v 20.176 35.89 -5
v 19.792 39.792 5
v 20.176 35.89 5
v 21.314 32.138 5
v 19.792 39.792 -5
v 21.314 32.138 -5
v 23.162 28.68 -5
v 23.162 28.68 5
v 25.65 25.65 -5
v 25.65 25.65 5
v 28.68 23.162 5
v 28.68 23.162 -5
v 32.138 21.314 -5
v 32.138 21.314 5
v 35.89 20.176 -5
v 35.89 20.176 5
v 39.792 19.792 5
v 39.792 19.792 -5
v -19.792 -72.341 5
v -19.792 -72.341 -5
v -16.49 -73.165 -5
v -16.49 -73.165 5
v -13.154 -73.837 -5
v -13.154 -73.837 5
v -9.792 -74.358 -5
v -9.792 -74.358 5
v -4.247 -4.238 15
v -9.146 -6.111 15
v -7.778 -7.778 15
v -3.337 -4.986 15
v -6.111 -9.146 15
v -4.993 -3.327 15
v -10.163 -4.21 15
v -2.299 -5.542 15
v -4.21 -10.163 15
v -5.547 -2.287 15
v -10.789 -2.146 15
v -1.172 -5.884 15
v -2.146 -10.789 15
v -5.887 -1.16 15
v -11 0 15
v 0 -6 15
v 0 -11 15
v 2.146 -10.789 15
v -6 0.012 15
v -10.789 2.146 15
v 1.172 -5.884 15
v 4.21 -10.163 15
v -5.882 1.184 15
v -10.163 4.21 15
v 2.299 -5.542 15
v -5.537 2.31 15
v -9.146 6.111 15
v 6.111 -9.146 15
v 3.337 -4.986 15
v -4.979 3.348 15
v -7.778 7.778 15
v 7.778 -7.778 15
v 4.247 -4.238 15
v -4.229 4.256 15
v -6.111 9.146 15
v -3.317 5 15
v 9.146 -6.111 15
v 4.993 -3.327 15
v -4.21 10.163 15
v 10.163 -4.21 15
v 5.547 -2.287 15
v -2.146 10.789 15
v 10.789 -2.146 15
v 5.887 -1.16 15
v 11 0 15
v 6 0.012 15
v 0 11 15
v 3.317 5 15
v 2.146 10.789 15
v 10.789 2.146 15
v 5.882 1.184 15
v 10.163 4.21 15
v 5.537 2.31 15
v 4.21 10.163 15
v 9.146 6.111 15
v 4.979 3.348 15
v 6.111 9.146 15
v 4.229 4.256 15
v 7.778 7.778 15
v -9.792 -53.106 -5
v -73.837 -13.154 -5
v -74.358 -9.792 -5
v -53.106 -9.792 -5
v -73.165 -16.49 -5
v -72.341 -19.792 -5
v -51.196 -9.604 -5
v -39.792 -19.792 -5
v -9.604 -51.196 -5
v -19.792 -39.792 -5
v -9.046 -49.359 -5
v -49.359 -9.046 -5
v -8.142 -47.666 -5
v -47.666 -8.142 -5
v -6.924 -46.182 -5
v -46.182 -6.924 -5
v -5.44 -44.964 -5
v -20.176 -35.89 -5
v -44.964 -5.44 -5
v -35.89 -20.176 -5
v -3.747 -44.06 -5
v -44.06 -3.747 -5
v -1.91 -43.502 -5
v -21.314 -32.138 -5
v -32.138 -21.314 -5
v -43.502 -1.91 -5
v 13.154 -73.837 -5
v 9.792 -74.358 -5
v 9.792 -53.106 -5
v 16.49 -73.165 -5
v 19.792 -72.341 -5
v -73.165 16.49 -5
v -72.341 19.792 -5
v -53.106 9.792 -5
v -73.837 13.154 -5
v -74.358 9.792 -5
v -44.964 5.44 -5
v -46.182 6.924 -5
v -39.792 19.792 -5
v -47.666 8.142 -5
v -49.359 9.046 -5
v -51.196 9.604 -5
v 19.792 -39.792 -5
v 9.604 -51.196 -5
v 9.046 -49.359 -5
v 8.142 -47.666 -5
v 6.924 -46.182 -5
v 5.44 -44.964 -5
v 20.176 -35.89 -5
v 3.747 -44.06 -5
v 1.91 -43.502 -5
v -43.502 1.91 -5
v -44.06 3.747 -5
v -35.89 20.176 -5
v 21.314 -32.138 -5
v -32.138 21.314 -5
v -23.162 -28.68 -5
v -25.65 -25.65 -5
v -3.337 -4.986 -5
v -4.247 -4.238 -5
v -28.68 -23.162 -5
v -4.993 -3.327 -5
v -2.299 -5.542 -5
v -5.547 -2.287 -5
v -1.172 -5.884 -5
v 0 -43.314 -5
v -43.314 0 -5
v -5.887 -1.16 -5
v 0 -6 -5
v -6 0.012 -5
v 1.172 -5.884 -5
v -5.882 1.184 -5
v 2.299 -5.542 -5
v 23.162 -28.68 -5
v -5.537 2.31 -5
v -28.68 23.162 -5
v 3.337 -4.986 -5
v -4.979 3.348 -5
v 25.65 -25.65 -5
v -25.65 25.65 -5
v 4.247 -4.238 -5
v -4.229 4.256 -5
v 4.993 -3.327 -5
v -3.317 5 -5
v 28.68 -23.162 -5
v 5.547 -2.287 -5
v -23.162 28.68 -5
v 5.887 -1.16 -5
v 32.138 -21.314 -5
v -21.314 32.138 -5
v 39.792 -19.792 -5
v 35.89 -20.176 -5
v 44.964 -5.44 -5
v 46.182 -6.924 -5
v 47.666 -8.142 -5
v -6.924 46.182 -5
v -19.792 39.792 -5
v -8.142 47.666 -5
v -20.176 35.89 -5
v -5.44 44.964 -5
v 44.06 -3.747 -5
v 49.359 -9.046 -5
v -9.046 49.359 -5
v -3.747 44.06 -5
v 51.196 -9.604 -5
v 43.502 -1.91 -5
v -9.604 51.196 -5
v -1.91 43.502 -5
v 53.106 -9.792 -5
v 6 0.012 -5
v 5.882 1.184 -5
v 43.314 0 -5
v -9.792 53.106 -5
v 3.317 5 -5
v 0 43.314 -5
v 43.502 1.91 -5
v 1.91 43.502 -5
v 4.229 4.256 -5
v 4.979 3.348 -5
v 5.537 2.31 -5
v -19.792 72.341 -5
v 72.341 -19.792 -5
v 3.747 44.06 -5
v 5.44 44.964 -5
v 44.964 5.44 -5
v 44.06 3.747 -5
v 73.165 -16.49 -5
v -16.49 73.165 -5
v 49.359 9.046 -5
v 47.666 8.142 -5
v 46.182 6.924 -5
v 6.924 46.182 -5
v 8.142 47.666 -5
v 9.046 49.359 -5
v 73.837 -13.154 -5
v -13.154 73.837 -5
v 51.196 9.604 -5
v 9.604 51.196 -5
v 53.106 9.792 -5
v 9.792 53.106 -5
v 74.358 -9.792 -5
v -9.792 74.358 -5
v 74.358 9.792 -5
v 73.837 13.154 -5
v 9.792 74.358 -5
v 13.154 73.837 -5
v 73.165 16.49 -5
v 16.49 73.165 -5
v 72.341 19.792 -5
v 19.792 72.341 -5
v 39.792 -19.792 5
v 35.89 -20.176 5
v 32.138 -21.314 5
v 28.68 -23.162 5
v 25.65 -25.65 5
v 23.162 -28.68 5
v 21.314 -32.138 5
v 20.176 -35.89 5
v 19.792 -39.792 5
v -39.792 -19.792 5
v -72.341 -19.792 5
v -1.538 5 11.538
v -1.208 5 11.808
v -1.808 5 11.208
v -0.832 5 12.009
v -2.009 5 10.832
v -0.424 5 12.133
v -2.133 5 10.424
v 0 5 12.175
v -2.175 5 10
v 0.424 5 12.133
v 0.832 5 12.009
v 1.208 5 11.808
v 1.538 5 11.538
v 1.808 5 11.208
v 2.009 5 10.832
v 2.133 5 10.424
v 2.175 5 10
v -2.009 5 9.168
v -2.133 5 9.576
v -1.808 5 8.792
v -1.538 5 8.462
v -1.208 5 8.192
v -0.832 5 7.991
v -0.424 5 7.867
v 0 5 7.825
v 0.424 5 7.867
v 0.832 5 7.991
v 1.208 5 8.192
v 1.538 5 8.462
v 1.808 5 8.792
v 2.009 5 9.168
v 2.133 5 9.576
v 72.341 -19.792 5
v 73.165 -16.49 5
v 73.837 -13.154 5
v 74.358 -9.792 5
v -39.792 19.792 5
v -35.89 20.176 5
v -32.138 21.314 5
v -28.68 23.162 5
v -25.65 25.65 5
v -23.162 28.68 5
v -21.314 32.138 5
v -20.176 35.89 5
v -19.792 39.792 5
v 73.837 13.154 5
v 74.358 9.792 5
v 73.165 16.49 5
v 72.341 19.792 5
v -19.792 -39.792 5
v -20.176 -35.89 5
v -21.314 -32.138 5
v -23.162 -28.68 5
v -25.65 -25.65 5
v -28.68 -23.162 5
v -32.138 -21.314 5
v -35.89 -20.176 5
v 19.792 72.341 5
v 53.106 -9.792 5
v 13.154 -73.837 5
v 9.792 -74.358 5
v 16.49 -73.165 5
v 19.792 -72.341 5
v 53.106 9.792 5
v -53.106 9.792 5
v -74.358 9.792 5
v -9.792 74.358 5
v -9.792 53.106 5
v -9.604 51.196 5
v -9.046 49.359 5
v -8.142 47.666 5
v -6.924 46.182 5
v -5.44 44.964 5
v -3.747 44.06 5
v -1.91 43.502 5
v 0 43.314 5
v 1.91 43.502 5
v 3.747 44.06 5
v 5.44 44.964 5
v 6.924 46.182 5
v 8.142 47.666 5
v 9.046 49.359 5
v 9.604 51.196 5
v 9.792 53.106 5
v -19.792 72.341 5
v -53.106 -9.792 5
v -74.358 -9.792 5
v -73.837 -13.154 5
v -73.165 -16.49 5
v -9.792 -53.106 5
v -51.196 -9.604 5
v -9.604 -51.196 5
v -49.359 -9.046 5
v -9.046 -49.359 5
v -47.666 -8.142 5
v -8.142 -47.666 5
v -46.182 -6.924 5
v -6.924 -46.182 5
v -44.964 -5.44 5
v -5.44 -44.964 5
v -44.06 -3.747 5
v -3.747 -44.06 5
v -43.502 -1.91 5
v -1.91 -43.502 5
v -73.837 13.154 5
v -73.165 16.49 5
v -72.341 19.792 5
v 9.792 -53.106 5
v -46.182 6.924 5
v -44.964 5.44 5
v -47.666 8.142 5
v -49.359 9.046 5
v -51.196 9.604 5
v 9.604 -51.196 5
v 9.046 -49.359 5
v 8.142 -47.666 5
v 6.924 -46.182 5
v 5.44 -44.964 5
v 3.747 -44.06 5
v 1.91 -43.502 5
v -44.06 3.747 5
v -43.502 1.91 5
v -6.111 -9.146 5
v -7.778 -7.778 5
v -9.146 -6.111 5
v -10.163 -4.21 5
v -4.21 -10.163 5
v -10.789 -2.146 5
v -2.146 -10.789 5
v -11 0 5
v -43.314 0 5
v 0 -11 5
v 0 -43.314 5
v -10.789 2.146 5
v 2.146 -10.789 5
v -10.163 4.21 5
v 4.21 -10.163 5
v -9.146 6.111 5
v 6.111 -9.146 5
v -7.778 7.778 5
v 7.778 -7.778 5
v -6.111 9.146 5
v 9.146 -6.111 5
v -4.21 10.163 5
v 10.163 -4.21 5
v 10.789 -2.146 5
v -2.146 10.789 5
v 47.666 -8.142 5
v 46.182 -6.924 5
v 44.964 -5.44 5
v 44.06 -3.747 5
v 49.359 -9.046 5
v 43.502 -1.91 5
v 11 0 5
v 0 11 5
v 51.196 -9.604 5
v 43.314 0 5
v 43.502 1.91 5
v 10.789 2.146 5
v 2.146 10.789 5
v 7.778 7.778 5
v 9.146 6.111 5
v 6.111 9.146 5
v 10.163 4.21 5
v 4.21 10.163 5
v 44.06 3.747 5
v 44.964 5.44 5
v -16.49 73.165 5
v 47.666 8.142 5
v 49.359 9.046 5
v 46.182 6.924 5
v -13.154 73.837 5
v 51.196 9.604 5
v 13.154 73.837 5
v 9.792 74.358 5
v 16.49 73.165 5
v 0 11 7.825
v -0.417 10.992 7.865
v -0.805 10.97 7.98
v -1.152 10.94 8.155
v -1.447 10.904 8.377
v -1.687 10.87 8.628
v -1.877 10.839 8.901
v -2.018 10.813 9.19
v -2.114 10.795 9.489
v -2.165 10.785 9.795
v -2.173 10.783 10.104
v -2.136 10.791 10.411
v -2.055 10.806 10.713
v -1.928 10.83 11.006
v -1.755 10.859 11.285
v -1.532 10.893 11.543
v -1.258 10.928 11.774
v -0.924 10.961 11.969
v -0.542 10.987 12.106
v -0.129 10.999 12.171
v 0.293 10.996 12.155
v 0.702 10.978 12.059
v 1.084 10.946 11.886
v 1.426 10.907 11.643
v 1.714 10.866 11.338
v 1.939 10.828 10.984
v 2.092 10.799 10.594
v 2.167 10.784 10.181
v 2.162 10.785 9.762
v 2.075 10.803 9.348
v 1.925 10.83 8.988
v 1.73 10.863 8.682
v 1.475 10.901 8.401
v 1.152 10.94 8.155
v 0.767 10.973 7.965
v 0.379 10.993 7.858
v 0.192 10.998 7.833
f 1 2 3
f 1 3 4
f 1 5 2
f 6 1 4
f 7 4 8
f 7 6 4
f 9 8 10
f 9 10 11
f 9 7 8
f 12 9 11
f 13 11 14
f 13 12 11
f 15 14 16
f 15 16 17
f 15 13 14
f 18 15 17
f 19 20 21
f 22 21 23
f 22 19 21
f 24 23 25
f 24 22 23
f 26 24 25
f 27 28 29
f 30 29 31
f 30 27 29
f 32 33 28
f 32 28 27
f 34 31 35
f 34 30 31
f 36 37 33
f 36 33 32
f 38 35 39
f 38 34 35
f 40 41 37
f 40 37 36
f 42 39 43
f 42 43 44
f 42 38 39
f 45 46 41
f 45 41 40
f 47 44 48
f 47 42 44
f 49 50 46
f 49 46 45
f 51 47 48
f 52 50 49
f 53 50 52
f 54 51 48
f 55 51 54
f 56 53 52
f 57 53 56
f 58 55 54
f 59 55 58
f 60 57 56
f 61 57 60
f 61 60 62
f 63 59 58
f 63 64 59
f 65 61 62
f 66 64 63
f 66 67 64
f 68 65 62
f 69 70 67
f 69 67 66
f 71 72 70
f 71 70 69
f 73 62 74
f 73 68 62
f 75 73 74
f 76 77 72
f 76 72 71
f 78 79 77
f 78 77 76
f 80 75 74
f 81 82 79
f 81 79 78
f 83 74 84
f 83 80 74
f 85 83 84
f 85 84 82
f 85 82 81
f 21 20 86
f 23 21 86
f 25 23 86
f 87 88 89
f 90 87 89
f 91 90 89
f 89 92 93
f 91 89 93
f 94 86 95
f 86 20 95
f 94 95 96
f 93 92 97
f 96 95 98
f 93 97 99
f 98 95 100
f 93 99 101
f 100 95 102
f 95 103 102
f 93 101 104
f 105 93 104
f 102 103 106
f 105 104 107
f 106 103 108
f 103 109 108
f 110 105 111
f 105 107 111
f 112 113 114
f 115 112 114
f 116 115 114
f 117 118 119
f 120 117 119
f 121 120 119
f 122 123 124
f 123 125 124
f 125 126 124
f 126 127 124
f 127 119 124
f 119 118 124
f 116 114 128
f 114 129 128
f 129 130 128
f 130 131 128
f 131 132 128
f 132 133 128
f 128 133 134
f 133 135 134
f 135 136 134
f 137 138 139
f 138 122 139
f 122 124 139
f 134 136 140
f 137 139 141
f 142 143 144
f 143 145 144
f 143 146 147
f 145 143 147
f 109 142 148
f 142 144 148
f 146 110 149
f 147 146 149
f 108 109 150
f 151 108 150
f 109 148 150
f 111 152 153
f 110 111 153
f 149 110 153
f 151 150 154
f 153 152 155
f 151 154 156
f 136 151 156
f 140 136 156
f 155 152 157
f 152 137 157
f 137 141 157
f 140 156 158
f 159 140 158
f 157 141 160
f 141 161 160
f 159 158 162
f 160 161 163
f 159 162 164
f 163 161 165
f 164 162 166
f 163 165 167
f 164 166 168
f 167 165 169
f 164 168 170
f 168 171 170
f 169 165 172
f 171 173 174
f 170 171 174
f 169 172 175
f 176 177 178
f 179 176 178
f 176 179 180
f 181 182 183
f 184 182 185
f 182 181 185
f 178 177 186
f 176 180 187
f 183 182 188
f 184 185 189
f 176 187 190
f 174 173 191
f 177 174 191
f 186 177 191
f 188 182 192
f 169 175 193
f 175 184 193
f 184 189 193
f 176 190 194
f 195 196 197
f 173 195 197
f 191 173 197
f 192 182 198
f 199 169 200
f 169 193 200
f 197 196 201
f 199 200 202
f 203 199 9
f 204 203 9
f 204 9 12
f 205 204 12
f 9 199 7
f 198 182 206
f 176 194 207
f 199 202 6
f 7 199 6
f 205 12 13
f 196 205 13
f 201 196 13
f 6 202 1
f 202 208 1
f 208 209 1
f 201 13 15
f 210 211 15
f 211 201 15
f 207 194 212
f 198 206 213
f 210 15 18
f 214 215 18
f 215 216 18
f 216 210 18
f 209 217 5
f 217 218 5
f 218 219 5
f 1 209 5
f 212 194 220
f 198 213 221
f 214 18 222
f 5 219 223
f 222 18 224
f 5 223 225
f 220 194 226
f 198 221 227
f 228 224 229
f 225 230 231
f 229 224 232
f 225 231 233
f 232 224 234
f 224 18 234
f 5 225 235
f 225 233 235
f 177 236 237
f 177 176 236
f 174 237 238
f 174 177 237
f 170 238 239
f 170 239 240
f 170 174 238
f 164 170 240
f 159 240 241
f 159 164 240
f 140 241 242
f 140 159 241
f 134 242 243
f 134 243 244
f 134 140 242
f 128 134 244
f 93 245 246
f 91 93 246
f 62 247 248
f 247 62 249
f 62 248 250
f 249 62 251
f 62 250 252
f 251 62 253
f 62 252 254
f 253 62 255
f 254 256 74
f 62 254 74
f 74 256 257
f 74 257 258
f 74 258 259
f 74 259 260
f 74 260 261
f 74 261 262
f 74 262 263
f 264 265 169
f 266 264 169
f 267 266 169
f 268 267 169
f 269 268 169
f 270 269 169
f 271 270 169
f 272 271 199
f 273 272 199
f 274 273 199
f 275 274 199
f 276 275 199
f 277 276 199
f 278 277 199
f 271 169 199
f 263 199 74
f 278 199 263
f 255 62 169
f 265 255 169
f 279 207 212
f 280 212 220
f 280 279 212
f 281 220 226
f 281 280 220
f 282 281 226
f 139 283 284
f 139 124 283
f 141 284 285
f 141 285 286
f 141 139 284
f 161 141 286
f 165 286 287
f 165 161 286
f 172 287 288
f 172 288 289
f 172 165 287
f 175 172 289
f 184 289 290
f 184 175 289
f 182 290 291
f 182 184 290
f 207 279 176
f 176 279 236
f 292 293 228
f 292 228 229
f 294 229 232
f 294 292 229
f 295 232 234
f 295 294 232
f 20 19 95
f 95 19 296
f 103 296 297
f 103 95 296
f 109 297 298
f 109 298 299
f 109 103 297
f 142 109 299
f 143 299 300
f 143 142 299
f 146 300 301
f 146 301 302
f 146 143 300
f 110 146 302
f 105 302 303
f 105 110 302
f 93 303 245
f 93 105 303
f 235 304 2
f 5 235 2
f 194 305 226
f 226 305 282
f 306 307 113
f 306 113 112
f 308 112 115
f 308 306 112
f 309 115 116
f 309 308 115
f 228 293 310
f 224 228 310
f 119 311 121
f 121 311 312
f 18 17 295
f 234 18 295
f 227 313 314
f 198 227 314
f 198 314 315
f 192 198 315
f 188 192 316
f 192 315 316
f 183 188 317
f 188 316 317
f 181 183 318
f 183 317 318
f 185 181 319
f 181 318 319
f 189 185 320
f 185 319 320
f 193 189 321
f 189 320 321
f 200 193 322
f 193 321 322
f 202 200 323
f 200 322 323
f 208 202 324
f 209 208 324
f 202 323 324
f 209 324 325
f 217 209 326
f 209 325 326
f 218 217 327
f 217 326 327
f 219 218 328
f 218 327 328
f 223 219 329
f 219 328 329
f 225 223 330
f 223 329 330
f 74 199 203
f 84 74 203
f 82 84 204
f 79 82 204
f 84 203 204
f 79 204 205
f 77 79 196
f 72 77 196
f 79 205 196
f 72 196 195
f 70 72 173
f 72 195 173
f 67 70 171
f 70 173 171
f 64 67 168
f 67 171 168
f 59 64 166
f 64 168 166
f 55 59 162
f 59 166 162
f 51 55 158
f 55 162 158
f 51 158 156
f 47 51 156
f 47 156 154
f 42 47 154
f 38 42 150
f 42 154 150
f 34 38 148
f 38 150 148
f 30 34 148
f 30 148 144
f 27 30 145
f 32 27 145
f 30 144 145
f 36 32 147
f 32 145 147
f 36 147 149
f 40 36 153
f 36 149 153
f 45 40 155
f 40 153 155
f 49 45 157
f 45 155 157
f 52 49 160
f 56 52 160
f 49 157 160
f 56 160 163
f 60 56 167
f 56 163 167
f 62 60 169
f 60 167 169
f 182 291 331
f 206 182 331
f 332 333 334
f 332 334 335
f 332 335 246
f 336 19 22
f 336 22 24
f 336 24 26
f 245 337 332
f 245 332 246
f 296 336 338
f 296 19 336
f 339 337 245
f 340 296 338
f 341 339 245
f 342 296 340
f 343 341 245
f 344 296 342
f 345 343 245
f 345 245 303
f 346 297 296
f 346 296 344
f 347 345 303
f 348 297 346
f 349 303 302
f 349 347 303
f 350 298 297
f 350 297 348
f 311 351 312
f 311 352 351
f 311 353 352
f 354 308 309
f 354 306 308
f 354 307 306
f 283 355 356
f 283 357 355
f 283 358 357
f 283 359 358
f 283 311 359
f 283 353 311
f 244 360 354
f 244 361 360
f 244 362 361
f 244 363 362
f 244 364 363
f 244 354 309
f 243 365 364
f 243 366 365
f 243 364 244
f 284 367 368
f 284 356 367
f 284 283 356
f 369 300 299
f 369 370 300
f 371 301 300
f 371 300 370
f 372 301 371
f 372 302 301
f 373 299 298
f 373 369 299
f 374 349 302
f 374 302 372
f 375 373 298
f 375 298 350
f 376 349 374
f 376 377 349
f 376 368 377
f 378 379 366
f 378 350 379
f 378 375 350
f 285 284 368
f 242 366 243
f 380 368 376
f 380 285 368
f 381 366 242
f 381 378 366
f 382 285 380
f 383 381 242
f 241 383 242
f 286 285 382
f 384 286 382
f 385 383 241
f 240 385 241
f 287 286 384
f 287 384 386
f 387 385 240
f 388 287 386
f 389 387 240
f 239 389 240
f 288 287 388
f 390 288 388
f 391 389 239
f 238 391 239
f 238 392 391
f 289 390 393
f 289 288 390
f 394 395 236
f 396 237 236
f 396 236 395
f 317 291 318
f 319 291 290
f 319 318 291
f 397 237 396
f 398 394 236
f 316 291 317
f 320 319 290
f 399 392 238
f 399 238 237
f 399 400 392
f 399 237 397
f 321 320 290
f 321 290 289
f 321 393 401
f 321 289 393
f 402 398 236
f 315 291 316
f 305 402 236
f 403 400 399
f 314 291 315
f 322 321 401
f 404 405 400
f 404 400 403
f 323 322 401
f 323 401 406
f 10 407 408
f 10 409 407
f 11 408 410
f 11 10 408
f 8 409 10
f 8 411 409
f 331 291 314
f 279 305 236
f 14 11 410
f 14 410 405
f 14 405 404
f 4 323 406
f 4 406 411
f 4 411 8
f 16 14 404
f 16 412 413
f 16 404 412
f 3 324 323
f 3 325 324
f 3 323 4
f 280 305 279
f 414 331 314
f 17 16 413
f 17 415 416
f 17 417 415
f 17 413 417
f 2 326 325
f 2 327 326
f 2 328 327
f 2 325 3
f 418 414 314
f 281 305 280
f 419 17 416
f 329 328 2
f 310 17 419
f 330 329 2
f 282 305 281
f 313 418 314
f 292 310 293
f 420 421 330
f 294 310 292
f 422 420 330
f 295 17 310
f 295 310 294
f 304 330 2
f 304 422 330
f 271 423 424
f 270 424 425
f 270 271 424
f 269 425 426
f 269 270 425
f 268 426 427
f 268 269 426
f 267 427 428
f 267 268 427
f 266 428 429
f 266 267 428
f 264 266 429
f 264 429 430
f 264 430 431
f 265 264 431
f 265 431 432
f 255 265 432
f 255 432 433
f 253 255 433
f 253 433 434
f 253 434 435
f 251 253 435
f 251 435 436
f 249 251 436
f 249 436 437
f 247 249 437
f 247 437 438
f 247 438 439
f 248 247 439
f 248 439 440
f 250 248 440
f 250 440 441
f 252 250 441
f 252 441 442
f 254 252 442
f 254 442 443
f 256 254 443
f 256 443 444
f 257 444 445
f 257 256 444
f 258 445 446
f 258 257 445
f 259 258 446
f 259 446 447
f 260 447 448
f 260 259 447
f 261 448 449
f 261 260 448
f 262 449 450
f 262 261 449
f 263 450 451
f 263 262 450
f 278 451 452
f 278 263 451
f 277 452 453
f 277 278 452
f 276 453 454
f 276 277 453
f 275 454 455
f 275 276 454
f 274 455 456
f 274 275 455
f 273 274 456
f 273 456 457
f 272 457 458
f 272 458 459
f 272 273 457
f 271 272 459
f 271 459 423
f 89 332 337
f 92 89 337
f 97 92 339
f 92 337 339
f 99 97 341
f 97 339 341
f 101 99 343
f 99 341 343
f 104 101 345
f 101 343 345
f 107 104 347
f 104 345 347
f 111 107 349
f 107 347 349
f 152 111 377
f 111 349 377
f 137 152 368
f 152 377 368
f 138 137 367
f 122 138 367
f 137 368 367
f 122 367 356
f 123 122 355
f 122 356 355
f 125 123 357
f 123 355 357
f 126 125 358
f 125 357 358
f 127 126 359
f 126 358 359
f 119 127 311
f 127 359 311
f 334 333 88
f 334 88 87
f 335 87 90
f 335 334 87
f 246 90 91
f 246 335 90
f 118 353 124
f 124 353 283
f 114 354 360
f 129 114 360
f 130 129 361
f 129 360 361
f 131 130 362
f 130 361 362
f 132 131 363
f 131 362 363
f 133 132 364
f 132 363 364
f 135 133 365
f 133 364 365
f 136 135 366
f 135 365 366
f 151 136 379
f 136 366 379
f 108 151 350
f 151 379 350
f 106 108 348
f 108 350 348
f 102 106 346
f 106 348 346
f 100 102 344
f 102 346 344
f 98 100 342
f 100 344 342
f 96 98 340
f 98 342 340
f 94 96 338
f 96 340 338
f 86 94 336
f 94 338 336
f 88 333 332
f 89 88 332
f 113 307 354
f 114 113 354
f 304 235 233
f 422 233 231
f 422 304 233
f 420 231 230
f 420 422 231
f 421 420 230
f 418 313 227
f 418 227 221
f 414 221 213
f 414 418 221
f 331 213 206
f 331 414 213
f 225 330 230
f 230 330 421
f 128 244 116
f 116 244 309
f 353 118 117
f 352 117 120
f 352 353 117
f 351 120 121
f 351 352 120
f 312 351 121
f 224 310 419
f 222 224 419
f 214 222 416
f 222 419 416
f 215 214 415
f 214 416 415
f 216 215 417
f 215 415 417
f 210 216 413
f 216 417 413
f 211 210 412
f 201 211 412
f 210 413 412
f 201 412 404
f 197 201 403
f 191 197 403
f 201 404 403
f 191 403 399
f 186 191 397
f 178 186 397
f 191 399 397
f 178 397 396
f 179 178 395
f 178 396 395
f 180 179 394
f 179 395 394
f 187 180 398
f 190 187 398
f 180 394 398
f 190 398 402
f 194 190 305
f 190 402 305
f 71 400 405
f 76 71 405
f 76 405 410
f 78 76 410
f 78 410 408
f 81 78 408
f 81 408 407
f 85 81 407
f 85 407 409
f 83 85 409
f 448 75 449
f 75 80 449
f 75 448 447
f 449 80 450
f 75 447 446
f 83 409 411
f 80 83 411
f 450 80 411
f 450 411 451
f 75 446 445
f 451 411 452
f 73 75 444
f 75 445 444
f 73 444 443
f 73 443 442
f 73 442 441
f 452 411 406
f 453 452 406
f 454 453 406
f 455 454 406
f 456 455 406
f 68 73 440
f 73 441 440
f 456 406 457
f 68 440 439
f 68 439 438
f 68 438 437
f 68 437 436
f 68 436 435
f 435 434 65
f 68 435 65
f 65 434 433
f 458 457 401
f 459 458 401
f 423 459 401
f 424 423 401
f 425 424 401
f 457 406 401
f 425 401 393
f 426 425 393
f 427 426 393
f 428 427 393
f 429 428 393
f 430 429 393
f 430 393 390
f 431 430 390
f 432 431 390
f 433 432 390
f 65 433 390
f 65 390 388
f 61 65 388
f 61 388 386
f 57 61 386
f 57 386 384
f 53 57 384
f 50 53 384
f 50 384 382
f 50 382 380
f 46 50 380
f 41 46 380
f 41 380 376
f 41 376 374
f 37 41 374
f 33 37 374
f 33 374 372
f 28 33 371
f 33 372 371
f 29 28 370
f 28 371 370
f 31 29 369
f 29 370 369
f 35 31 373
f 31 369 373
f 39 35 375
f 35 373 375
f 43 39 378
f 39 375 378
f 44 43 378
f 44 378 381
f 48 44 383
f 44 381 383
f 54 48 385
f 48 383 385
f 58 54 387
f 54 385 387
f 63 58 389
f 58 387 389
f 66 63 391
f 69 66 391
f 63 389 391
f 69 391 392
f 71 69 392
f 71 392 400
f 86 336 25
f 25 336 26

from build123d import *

# Parameters (mm, degrees)
ESQUISSE1_R                  = 75
BOSS_EXTRU_1_DEPTH           = 5
ENL_V_MAT_EXTRU_1_DEPTH      = 20
R_P_TITION_CIRCULAIRE1_COUNT = 4
ESQUISSE3_W                  = 52.549672888
ESQUISSE3_H                  = 52.549672888
ENL_V_MAT_EXTRU_2_DEPTH      = 20
R_P_TITION_CIRCULAIRE2_COUNT = 4
CONG_1_R                     = 20
ENL_V_MAT_EXTRU_3_DEPTH      = 106.632580986
ENL_V_MAT_EXTRU_3_DEPTH_BACK = 106.632580986
ESQUISSE6_R                  = 11
BOSS_EXTRU_2_DEPTH           = 10
ESQUISSE7_R                  = 2.175
ENL_V_MAT_EXTRU_4_DEPTH      = 14


with BuildPart() as part:
    # Esquisse1 → Boss.-Extru.1 (new, symmetric)
    with BuildSketch(Plane.XY):
        Circle(ESQUISSE1_R)
    extrude(amount=BOSS_EXTRU_1_DEPTH, both=True)

    # Esquisse2 → Enlèv. mat.-Extru.1 (cut)
    with BuildSketch(Plane.XY.offset(5)):
        with BuildLine():
            Line((-53.106036975, 9.791778038), (-74.358059972, 9.791778038))
            ThreePointArc((-74.358059972, 9.791778038), (-75, 0), (-74.358059972, -9.791778038))
            Line((-74.358059972, -9.791778038), (-53.106036975, -9.791778038))
            ThreePointArc((-53.106036975, -9.791778038), (-43.314258937, 0), (-53.106036975, 9.791778038))
        make_face()
    enl_v_mat_extru_1 = extrude(amount=-ENL_V_MAT_EXTRU_1_DEPTH, mode=Mode.SUBTRACT)

    # Répétition circulaire1: Enlèv. mat.-Extru.1 ×4 about axis
    r_p_tition_circulaire1_axis = Axis((0, 0, 0), (0, 0, 1))
    for i in range(1, R_P_TITION_CIRCULAIRE1_COUNT):
        add(enl_v_mat_extru_1.rotate(r_p_tition_circulaire1_axis, i * 360 / R_P_TITION_CIRCULAIRE1_COUNT), mode=Mode.SUBTRACT)

    # Esquisse3 → Enlèv. mat.-Extru.2 (cut)
    with BuildSketch(Plane.XY.offset(5)):
        with Locations((-46.066614482, 46.066614482)):
            Rectangle(ESQUISSE3_W, ESQUISSE3_H)
    enl_v_mat_extru_2 = extrude(amount=-ENL_V_MAT_EXTRU_2_DEPTH, mode=Mode.SUBTRACT)

    # Répétition circulaire2: Enlèv. mat.-Extru.2 ×4 about axis
    r_p_tition_circulaire2_axis = Axis((0, 0, 0), (0, 0, 1))
    for i in range(1, R_P_TITION_CIRCULAIRE2_COUNT):
        add(enl_v_mat_extru_2.rotate(r_p_tition_circulaire2_axis, i * 360 / R_P_TITION_CIRCULAIRE2_COUNT), mode=Mode.SUBTRACT)

    # Congé1
    cong_1_edges = [part.edges().sort_by_distance(p)[0] for p in [
        (-19.791778038, -19.791778038, 0),
        (19.791778038, -19.791778038, 0),
        (19.791778038, 19.791778038, 0),
        (-19.791778038, 19.791778038, 0),
    ]]
    fillet(cong_1_edges, radius=CONG_1_R)

    # Esquisse4 → Enlèv. mat.-Extru.3 (cut, two sides: drawn at the far end of the back side and taken through both)
    with BuildSketch(Plane.XY.offset(5).offset(-ENL_V_MAT_EXTRU_3_DEPTH_BACK)):
        with BuildLine():
            Line((-3.31662479, 5), (3.31662479, 5))
            ThreePointArc((3.31662479, 5), (0, -6), (-3.31662479, 5))
        make_face()
    extrude(amount=ENL_V_MAT_EXTRU_3_DEPTH + ENL_V_MAT_EXTRU_3_DEPTH_BACK, mode=Mode.SUBTRACT)

    # Esquisse6 → Boss.-Extru.2 (add)
    with BuildSketch(Plane.XY.offset(5)):
        Circle(ESQUISSE6_R)
        with BuildLine():
            Line((-3.31662479, 5), (3.31662479, 5))
            ThreePointArc((3.31662479, 5), (0, -6), (-3.31662479, 5))
        make_face(mode=Mode.SUBTRACT)
    extrude(amount=BOSS_EXTRU_2_DEPTH)

    # Esquisse7 → Enlèv. mat.-Extru.4 (cut)
    with BuildSketch(Plane(origin=(0, 0, 0), x_dir=(1, 0, 0), z_dir=(0, 1, 0))):
        with Locations(Location((0, -10, 0), (0, 0, 90))):
            Circle(ESQUISSE7_R)
    extrude(amount=ENL_V_MAT_EXTRU_4_DEPTH, mode=Mode.SUBTRACT)


solid = part.part
